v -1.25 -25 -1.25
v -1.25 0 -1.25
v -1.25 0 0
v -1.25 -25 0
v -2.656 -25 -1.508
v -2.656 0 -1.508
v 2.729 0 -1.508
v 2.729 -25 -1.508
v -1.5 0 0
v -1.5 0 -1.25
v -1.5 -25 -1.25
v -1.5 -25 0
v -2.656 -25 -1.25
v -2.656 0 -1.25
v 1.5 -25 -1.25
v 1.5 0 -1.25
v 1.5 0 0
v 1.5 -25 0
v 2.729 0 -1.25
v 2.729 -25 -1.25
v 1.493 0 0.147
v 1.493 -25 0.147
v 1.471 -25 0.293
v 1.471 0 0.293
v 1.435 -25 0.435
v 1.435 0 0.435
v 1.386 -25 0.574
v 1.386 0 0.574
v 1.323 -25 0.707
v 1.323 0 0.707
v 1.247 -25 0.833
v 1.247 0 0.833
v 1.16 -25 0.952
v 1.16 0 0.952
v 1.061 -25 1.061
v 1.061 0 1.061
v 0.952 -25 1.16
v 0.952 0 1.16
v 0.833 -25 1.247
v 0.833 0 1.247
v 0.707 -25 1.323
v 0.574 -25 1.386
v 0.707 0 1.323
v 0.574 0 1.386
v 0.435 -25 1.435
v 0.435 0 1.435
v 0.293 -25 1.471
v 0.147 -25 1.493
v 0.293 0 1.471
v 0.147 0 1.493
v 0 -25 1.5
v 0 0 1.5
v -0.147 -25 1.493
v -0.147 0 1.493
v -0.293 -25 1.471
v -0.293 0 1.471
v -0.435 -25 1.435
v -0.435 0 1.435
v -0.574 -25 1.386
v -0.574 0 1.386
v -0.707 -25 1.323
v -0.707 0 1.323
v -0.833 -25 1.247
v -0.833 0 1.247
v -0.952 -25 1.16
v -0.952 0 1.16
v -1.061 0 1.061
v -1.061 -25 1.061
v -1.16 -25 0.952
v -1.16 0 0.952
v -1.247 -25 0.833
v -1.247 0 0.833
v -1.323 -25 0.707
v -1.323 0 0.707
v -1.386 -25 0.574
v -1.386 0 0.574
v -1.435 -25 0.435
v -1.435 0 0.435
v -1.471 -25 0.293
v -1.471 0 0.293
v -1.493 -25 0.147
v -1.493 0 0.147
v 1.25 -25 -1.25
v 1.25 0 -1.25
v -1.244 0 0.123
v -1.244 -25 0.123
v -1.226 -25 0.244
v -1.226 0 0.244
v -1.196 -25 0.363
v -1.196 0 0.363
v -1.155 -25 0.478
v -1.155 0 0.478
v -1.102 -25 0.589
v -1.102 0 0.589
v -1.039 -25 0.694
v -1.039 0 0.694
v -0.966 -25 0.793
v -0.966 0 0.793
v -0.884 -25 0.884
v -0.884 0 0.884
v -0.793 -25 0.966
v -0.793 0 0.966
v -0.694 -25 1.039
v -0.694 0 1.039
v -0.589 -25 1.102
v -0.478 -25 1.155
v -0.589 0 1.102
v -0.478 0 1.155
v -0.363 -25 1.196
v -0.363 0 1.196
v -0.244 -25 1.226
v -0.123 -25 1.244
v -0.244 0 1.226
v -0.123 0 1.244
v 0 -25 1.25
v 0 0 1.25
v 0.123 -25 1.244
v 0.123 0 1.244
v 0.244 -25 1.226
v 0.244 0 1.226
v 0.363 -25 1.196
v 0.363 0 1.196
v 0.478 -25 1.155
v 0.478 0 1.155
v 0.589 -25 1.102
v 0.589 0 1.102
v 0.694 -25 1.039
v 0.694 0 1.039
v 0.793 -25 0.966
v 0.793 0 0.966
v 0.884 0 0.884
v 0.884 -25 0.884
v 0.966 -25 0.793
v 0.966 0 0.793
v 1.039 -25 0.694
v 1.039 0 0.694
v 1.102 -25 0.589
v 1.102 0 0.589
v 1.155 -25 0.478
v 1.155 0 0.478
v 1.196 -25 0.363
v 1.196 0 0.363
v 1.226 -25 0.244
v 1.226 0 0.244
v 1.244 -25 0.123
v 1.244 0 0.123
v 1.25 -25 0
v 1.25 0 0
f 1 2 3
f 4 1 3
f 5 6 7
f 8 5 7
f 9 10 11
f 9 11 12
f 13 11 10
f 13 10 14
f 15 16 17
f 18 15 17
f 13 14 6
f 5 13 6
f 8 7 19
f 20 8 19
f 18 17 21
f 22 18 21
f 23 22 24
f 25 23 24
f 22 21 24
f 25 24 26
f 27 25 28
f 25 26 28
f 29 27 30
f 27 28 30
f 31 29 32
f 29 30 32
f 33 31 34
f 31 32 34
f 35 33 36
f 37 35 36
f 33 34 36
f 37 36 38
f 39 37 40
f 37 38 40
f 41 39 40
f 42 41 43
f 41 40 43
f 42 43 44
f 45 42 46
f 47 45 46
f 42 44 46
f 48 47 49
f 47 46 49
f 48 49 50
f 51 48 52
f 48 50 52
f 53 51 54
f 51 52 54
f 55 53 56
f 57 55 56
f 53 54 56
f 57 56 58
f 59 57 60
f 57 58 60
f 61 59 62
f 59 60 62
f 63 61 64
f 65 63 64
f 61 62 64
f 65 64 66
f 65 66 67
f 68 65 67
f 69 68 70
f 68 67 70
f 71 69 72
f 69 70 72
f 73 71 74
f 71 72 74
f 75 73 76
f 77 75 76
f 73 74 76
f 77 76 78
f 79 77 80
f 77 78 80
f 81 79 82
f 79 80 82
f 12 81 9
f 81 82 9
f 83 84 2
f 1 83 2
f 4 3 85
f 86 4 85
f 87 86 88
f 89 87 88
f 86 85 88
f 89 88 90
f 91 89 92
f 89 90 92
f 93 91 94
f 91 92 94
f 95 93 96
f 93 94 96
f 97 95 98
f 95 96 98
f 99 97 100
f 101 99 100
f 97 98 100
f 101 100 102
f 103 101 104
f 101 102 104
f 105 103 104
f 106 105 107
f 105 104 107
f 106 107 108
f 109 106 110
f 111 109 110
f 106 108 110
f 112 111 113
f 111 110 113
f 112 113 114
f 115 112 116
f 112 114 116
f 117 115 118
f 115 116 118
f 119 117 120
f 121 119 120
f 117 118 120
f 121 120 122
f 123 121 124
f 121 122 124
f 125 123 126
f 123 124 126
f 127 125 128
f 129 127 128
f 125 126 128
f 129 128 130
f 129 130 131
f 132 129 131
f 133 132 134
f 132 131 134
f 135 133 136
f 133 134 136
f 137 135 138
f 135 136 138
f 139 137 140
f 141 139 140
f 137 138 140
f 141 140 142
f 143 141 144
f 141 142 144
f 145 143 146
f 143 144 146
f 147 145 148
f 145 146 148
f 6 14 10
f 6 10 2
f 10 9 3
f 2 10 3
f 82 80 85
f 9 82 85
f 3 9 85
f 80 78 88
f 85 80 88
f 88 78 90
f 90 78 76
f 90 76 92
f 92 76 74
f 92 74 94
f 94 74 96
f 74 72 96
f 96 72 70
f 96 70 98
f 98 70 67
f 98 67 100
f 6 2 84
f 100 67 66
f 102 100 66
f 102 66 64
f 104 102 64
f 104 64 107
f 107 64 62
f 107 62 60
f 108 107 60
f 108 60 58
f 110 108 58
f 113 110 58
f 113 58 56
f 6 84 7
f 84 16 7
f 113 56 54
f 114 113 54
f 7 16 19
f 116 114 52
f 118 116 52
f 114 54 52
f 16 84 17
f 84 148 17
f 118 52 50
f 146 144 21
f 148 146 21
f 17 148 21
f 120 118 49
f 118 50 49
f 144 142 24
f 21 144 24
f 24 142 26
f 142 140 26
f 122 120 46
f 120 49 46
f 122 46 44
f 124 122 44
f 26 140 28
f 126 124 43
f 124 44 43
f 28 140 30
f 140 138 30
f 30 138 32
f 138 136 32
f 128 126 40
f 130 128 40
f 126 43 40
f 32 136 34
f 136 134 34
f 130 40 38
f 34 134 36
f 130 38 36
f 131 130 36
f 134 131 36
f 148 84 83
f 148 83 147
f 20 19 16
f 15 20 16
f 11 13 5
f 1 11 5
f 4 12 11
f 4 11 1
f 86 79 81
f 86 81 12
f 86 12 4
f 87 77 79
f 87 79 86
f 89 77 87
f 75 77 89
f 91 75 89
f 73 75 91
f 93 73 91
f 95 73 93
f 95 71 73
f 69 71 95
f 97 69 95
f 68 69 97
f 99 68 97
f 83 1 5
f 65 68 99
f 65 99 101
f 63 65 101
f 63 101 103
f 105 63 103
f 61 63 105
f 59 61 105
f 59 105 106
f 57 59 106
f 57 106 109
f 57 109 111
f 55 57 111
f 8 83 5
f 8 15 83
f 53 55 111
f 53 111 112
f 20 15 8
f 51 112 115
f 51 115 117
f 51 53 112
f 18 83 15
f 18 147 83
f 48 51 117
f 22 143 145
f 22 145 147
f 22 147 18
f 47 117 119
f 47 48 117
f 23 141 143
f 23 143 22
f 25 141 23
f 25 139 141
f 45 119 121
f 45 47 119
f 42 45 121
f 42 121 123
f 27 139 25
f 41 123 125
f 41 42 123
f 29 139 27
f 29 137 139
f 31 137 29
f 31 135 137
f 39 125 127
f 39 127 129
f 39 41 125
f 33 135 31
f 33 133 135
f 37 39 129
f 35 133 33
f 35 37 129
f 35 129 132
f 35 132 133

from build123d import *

# Parameters (mm, degrees)
F0_W     = 0.25
F0_H     = 1.25
F1_DEPTH = 25


# Not quite as in the source:
# - a feature names something its author has since deleted; it is built from what else it names


with BuildPart() as f1:
    # F0 (on Front) → F1 (new body)
    with BuildSketch(Plane.XZ):
        with BuildLine():
            ThreePointArc((-1.25, 0), (0, 1.25), (1.25, 0))
            Line((1.25, 0), (1.5, 0))
            ThreePointArc((1.5, 0), (0, 1.5), (-1.5, 0))
            Line((-1.5, 0), (-1.25, 0))
        make_face()
        with Locations((1.375, -0.625)):
            Rectangle(F0_W, F0_H)
        with Locations((-1.375, -0.625)):
            Rectangle(F0_W, F0_H)
        Polygon((1.5, -1.25), (1.25, -1.25), (-1.25, -1.25), (-1.5, -1.25), (-2.6555589866, -1.25), (-2.6555589866, -1.5083510661), (2.7294615284, -1.5083510661), (2.7294615284, -1.25), align=None)
    extrude(amount=F1_DEPTH)


solid = f1.part
